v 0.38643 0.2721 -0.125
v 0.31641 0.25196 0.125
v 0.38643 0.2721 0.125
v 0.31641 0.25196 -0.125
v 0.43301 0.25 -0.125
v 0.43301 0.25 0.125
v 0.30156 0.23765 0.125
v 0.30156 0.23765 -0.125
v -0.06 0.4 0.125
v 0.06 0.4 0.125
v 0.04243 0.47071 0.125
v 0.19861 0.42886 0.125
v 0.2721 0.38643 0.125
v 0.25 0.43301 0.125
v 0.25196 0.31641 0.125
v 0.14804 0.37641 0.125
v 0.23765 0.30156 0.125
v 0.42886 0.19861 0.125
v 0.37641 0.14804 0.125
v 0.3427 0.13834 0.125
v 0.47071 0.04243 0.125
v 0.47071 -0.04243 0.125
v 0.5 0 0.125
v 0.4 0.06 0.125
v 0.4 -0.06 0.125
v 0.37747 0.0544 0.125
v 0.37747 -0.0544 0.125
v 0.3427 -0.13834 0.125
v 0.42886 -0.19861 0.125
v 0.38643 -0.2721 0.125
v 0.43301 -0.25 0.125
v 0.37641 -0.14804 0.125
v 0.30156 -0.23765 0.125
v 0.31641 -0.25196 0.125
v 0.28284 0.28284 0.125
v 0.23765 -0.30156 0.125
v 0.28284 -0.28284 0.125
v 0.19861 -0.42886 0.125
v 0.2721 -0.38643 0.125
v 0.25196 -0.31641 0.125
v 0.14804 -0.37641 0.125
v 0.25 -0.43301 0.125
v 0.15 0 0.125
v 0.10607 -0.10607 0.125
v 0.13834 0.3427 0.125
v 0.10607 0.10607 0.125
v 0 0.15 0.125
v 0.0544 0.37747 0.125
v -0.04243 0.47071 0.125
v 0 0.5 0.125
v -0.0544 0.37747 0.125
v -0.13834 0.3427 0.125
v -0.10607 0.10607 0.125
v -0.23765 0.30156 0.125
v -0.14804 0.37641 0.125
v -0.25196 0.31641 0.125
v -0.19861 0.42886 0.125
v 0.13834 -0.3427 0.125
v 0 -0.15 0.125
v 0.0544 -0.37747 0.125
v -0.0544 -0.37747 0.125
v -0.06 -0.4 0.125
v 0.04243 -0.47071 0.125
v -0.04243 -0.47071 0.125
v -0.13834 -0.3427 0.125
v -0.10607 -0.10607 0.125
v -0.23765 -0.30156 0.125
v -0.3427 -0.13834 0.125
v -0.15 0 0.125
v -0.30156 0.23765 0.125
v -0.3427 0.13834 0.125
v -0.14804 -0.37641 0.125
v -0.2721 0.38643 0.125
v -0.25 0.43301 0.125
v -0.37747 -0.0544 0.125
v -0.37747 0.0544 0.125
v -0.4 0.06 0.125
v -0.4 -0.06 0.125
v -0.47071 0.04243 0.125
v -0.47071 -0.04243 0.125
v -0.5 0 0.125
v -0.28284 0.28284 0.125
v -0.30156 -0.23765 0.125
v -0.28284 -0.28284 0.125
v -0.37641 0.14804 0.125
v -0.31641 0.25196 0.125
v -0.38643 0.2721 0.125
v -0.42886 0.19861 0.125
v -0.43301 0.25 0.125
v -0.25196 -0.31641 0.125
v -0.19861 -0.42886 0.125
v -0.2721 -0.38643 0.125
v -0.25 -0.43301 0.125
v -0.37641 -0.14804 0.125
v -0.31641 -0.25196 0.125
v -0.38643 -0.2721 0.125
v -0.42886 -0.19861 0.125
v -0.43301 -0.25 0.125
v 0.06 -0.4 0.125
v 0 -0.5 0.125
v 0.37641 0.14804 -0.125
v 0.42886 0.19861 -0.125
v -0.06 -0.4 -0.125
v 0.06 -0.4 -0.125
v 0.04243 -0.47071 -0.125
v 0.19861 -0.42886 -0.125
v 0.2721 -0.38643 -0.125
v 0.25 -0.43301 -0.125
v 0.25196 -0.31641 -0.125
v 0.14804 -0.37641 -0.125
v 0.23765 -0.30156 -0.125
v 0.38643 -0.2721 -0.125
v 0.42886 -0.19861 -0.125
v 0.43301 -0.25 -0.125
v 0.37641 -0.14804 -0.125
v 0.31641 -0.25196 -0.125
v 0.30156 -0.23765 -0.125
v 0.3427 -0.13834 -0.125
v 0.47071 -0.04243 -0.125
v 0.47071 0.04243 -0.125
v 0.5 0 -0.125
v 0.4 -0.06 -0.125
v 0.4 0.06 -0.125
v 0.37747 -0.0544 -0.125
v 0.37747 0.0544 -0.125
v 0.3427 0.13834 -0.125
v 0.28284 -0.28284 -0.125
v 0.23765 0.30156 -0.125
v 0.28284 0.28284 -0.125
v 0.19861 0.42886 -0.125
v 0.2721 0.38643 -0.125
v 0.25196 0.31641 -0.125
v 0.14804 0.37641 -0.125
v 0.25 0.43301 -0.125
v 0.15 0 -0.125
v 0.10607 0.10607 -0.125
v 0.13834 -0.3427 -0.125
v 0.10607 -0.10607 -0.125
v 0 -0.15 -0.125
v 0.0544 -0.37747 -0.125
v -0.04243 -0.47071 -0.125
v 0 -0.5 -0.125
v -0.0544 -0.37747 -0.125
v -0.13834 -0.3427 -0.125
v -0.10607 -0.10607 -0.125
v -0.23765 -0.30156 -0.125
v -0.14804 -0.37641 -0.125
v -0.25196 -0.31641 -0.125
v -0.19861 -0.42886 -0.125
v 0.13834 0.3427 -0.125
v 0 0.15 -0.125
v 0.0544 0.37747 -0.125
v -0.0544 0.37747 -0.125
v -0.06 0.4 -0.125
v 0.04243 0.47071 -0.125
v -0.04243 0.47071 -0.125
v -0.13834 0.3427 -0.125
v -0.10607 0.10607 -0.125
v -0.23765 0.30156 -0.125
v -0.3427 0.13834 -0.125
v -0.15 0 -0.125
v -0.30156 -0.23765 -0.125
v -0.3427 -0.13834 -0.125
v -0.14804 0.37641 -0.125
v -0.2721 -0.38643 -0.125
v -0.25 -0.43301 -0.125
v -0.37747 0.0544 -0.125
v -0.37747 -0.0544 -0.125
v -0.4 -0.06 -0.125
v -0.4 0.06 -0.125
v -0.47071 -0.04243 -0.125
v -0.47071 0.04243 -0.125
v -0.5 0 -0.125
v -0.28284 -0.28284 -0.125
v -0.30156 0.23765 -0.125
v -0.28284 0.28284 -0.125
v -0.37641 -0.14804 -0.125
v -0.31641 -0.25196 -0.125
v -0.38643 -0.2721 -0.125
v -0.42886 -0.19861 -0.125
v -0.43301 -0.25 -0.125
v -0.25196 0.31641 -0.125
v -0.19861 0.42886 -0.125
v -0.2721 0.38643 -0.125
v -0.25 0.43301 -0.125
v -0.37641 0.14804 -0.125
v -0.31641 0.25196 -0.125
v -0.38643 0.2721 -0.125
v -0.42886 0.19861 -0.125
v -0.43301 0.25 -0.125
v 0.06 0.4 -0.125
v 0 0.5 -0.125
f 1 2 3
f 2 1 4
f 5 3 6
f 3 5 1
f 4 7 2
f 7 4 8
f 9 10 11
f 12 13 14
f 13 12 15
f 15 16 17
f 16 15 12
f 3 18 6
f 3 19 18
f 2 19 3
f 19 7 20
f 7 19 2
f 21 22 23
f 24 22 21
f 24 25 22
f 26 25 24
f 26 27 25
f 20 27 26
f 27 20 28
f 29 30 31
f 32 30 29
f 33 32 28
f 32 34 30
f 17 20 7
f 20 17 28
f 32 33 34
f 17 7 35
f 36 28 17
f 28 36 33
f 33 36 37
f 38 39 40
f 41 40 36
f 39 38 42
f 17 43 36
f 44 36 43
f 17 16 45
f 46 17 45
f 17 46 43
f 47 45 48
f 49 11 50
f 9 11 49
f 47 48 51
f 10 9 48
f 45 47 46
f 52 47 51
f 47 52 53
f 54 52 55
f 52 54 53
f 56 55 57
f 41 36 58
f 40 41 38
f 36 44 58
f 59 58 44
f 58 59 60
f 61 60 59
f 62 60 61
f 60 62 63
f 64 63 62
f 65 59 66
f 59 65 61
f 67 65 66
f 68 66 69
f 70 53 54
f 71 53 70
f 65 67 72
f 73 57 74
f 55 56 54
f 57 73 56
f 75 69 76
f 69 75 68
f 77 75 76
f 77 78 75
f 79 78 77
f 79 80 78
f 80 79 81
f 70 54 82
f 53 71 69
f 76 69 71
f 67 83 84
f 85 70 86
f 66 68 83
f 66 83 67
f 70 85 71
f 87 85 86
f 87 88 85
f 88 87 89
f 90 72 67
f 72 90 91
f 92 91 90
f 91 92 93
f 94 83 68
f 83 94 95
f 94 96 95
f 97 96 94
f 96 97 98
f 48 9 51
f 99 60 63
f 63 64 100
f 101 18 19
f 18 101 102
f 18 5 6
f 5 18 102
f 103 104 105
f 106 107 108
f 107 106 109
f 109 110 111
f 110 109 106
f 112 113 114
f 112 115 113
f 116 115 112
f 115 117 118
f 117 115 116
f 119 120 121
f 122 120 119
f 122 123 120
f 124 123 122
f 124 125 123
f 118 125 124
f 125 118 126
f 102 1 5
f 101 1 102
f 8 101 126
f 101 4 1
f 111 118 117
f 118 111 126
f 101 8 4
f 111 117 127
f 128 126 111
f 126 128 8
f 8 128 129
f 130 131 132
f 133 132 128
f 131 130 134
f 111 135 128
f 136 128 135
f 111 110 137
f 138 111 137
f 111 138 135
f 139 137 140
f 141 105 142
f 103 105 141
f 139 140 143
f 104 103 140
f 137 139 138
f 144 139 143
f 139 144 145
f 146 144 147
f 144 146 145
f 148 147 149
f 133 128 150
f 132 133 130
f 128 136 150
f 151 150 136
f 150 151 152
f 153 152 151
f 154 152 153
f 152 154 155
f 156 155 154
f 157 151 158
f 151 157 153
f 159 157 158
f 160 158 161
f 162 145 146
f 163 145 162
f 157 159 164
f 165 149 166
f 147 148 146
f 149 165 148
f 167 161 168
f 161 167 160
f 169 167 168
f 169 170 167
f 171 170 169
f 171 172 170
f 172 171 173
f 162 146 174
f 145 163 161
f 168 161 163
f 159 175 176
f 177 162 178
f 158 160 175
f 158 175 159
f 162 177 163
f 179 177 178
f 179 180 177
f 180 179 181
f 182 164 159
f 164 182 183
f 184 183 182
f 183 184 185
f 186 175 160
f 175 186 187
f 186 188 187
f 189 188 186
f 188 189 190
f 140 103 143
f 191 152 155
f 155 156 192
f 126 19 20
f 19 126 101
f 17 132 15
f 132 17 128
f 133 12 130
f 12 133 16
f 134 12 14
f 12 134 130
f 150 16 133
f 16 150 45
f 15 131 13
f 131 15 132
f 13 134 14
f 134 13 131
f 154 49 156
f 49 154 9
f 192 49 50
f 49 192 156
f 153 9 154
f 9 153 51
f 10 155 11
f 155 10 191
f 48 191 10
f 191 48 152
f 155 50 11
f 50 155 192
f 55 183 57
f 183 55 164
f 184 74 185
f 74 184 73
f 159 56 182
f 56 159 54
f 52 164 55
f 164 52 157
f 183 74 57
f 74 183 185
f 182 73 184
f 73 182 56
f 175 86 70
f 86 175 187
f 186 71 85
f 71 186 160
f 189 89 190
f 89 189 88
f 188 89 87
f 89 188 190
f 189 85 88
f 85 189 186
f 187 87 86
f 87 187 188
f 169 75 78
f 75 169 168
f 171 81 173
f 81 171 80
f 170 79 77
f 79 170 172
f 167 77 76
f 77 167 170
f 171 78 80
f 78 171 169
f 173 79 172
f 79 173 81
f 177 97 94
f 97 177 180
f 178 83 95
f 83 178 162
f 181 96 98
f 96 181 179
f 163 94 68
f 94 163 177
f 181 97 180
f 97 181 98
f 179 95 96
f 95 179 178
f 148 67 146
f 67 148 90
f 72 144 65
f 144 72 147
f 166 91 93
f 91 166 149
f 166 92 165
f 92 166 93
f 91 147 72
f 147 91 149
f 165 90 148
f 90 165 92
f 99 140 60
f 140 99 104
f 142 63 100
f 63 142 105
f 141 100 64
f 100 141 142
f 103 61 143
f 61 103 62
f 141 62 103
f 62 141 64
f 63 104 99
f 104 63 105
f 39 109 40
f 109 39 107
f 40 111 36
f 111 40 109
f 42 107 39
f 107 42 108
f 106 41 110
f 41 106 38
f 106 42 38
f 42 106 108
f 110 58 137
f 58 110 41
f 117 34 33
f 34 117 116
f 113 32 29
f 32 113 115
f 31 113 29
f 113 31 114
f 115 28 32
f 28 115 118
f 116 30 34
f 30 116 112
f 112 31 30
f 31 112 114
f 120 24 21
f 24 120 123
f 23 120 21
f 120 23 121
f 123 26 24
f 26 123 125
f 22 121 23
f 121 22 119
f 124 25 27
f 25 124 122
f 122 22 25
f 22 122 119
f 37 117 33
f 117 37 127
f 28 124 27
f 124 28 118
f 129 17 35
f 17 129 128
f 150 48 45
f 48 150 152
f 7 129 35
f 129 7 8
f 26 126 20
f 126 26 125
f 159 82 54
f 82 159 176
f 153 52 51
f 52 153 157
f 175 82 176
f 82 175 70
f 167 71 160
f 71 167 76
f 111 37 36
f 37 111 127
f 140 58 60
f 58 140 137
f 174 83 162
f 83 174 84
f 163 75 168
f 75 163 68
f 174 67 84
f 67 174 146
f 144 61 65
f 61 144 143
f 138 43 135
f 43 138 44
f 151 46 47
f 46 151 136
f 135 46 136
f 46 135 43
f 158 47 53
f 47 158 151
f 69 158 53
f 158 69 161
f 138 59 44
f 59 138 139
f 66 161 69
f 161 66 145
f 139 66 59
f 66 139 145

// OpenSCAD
use <lib.scad>

module ld() {
	difference() {
		union() {
			cyl(0.4, 0.4, 0.25);
			for (i = [1:12])
				rotate([0,0,i*360/12]) translate([0.4,0,0]) scale([1,0.6,1]) cyl(0.1, 0.1, 0.25);
		}
		#cyl(0.15,0.15,0.5);
	}
}

module hd() {
	difference() {
		union() {
			cyl(0.4, 0.4, 0.25);
			for (i = [1:12])
				rotate([0,0,i*360/12]) translate([0.4,0,0]) scale([1,0.6,1]) cyl(0.1, 0.1, 0.25);
		}
		#cyl(0.15,0.15,0.5);
	}
}

//hd($fn=16);
ld($fn=8);
